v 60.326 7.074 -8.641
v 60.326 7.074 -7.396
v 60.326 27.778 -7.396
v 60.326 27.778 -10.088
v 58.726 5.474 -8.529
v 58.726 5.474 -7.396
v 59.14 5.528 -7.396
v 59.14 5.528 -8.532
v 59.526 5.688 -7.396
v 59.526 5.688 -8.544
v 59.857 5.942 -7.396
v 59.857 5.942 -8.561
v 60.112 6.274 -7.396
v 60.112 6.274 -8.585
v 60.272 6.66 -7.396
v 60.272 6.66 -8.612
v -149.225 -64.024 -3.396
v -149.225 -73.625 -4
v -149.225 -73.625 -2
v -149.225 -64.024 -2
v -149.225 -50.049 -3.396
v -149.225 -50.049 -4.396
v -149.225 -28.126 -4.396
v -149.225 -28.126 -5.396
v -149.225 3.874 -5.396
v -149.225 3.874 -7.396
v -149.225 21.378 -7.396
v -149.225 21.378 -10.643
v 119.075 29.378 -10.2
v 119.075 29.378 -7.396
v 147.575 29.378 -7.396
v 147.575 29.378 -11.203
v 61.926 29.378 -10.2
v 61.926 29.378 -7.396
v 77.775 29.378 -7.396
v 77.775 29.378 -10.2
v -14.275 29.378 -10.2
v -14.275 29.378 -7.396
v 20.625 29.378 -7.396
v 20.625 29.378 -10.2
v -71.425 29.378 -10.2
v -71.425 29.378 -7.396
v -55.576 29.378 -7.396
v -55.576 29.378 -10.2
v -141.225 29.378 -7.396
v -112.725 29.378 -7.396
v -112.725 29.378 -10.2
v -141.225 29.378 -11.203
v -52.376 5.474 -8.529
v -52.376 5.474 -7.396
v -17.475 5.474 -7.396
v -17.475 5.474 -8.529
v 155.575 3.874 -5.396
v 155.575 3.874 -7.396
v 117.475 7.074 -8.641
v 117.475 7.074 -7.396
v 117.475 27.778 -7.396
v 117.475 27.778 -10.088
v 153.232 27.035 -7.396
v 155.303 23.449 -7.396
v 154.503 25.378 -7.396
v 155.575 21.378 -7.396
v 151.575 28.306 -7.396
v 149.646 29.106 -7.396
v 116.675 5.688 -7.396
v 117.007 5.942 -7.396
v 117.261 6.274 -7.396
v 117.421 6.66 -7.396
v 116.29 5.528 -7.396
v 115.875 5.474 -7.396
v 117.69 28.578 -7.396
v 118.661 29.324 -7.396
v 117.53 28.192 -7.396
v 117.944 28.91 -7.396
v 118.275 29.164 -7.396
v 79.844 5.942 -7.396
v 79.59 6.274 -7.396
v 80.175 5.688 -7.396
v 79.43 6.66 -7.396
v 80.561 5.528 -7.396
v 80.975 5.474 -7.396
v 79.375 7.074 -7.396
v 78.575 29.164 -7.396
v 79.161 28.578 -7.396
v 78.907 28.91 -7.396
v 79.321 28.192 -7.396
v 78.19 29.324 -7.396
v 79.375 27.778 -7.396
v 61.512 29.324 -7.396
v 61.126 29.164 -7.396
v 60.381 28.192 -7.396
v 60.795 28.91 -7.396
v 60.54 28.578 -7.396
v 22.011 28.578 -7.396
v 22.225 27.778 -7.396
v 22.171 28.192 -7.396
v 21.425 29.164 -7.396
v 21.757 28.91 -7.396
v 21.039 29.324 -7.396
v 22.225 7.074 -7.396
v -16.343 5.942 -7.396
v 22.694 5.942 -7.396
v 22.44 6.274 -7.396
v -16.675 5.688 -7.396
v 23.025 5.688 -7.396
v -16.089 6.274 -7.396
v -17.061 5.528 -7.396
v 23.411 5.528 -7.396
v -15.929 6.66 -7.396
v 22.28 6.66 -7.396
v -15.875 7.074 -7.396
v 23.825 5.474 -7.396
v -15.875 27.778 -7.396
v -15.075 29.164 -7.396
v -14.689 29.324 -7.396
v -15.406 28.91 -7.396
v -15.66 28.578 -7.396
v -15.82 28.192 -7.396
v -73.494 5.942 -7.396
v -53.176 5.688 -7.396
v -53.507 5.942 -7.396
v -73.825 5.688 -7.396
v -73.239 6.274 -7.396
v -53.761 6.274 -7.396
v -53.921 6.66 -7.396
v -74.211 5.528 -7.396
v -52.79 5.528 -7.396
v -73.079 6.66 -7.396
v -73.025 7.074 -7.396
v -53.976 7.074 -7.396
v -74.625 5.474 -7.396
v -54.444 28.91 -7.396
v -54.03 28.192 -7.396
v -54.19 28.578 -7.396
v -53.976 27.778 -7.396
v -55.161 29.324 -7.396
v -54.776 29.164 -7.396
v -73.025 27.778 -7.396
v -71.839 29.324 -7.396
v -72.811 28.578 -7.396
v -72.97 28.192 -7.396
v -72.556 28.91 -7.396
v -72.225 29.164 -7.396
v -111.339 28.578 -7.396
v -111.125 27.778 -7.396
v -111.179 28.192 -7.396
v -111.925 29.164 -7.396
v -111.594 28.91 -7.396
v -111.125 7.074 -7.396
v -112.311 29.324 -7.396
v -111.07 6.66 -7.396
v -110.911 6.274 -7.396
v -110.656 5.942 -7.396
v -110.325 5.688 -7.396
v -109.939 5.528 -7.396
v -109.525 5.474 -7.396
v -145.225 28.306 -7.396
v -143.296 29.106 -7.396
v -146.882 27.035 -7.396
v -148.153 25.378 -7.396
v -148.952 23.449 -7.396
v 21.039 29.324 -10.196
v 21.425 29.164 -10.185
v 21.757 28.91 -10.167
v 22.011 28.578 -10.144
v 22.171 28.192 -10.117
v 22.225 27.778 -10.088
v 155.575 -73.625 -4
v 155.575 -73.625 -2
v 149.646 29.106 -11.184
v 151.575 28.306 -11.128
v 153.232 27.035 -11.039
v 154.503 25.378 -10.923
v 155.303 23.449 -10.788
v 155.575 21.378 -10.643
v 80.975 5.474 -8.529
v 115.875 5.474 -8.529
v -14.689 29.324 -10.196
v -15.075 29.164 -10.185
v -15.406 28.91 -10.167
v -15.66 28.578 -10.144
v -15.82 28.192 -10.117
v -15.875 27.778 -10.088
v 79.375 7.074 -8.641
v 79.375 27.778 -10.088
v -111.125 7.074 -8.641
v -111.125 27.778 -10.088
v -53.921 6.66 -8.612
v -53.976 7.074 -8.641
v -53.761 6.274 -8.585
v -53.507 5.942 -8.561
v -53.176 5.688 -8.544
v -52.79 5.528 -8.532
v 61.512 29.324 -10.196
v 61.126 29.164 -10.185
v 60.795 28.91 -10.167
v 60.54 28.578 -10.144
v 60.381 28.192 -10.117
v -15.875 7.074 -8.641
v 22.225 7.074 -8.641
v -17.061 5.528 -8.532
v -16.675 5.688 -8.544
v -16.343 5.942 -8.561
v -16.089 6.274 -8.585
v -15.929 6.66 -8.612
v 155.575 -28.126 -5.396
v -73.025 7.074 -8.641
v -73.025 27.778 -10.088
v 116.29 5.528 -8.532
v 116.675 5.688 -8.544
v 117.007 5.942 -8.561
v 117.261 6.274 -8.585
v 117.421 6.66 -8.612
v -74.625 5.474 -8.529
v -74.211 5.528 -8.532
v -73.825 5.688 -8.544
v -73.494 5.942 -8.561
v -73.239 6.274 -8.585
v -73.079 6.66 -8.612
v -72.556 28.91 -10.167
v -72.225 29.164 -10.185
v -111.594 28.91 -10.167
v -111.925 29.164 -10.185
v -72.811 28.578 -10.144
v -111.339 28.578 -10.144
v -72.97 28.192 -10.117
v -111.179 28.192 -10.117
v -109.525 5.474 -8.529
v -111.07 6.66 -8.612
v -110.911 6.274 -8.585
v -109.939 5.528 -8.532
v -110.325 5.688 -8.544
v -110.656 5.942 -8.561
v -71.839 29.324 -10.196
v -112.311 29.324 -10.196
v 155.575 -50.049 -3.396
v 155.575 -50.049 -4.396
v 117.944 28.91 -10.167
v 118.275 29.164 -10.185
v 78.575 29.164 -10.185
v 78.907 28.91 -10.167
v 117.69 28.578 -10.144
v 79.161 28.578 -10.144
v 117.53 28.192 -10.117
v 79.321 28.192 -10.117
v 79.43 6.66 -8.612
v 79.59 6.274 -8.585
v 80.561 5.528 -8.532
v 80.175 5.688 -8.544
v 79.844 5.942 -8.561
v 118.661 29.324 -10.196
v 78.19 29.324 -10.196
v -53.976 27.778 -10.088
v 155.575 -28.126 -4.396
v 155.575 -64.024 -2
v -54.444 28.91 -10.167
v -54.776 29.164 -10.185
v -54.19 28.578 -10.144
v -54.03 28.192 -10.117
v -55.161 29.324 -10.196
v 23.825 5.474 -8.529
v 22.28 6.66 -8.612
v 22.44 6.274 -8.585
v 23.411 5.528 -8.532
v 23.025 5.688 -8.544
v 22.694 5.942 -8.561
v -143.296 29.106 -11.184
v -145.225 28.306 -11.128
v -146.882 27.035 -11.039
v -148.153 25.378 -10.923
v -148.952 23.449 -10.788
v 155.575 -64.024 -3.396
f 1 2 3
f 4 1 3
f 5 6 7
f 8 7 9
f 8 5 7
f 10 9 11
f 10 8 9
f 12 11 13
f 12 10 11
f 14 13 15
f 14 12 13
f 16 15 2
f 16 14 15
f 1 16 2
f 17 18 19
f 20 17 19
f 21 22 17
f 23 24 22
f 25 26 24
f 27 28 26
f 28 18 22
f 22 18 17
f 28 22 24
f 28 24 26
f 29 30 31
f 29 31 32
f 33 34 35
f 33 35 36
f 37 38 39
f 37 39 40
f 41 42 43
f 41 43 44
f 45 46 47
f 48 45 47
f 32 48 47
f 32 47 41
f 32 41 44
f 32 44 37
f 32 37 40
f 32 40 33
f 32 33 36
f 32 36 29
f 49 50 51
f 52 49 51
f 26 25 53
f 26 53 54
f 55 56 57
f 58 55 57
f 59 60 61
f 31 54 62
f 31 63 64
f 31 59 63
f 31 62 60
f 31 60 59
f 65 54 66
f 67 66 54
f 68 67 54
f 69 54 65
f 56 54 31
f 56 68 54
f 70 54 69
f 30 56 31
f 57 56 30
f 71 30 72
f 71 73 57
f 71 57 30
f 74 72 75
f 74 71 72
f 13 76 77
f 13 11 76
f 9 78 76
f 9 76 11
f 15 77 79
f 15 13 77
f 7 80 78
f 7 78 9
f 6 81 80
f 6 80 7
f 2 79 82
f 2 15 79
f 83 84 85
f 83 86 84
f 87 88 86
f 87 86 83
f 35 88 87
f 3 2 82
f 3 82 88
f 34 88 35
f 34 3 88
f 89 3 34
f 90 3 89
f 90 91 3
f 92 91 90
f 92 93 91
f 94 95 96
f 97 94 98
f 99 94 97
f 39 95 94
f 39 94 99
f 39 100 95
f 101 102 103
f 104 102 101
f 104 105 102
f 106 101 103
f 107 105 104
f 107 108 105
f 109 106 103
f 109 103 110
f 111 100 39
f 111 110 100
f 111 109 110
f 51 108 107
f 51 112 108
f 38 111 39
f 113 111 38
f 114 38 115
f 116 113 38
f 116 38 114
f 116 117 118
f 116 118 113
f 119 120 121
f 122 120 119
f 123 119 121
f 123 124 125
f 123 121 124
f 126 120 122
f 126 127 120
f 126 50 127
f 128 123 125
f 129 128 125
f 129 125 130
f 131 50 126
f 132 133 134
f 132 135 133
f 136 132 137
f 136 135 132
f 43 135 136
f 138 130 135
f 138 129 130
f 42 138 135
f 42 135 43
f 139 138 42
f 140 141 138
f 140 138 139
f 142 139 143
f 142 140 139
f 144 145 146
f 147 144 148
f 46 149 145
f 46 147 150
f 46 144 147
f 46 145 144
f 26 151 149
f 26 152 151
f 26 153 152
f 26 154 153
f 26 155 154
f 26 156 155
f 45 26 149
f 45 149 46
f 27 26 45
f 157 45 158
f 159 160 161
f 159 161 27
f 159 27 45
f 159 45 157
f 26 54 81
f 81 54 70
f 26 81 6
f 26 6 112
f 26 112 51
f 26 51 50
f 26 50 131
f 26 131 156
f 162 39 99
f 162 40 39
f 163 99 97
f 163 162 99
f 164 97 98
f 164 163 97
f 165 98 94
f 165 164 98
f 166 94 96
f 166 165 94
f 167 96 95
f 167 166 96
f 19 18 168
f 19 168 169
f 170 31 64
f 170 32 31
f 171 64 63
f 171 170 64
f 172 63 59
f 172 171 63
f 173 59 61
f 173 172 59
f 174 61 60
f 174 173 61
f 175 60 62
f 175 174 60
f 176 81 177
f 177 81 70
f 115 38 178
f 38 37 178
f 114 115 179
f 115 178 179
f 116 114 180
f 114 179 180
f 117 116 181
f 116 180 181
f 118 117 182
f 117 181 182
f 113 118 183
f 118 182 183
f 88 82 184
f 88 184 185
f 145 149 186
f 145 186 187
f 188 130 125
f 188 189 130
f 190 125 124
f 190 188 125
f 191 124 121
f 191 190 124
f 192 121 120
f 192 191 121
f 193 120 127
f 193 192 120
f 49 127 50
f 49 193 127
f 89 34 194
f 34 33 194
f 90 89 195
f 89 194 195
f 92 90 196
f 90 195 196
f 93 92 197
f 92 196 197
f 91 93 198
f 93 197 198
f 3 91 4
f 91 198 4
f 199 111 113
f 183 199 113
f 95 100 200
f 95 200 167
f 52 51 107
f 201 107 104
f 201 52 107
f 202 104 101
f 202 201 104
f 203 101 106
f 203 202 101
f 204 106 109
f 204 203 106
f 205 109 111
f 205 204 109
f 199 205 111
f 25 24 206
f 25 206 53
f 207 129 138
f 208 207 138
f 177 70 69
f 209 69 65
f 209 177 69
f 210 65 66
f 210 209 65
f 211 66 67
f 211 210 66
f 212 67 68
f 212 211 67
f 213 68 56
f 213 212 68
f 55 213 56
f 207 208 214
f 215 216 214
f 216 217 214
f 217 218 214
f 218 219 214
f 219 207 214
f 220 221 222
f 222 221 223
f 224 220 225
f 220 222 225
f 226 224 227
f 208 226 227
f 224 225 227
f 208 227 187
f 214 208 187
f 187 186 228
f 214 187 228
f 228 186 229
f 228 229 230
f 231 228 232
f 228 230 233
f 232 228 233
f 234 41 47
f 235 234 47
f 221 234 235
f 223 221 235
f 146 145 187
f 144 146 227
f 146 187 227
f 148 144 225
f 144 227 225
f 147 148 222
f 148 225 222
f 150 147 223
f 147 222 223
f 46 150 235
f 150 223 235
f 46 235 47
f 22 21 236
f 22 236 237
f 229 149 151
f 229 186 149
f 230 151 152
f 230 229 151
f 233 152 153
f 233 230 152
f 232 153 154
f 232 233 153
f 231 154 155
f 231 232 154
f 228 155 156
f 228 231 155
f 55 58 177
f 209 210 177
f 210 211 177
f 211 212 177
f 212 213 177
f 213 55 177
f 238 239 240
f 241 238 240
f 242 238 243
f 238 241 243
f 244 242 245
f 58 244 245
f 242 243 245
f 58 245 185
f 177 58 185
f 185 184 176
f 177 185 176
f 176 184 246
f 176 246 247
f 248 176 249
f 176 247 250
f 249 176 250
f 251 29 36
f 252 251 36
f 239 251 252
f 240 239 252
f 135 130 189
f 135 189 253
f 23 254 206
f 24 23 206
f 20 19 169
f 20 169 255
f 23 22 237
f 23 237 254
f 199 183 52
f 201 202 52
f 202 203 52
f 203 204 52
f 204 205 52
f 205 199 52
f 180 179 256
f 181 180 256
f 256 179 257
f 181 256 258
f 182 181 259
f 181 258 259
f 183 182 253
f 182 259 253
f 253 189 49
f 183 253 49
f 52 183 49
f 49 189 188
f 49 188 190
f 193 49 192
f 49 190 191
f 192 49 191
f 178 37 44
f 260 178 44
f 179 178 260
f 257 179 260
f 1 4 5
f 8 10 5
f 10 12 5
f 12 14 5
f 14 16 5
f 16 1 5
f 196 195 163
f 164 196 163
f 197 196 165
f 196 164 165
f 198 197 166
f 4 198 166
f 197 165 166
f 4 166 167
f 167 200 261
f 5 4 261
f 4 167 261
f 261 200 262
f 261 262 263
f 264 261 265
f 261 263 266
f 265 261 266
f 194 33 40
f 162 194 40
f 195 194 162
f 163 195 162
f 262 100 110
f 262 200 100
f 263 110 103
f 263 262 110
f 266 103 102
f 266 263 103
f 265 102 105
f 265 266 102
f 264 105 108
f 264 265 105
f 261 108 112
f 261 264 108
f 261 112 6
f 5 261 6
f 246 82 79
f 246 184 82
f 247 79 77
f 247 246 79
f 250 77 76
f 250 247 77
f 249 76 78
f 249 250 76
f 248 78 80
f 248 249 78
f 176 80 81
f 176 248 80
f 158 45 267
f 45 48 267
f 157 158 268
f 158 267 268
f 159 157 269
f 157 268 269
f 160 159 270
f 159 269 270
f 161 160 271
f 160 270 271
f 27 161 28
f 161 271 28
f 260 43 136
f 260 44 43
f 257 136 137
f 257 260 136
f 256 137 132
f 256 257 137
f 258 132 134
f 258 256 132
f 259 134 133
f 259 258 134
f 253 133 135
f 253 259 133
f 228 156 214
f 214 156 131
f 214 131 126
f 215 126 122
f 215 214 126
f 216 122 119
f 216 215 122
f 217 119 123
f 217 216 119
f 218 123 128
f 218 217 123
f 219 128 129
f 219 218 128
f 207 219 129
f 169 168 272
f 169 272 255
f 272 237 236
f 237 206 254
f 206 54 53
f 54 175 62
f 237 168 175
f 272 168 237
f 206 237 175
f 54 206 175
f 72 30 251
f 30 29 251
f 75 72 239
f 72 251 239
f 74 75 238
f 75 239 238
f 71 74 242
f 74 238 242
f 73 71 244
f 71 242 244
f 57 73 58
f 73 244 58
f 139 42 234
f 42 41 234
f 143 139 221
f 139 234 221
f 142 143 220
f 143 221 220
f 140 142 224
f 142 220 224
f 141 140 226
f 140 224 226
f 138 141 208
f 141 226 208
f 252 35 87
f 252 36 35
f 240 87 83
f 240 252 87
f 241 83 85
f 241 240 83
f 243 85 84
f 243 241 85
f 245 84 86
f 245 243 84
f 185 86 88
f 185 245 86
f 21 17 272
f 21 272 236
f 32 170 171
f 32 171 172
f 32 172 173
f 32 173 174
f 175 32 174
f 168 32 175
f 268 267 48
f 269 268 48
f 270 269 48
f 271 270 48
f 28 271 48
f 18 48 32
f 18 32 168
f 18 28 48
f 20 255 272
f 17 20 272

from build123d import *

# Parameters (mm, degrees)
BOSS_EXTRUDE1_DEPTH              = 304.800275
FILLET1_R                        = 8
CUT_EXTRUDE1_REACH               = 6.806
CUT_EXTRUDE1_OFFSET_FROM_SURFACE = 1
SKETCH2_W                        = 38.10085
SKETCH2_H                        = 23.904524524
SKETCH2_W_2                      = 38.1
FILLET2_R                        = 1.6
FILLET3_R                        = 1.6


with BuildPart() as part:
    # Sketch1 → Boss-Extrude1 (new body)
    with BuildSketch(Plane.ZY.offset(149.225)):
        Polygon((-2, -64.023653), (-3.3962, -64.023653), (-3.3962, -50.048837521), (-4.3962, -50.048837521), (-4.3962, -28.126347), (-5.3962, -28.126347), (-5.3962, 3.873653), (-7.3962, 3.873653), (-7.3962, 29.378177524), (-11.202667042, 29.378177524), (-4, -73.62476), (-2, -73.62476), align=None)
    extrude(amount=-BOSS_EXTRUDE1_DEPTH)

    # Fillet1
    fillet1_edges = [part.edges().sort_by_distance(p)[0] for p in [
        (-149.225, 29.378177524, -9.299433521),
        (155.575275, 29.378177524, -9.299433521),
    ]]
    fillet(fillet1_edges, radius=FILLET1_R)

    # Cut-Extrude1: up to this face of the body (flat: up to its plane, moved by the offset)
    cut_extrude1_end = Plane(part.part.faces().sort_by_distance((3.1751375, -22.166826572, -7.598289234))[0]).offset(-CUT_EXTRUDE1_OFFSET_FROM_SURFACE)
    # Sketch2 → Cut-Extrude1 (cut, up to the picked face)
    with BuildSketch(Plane.XY.offset(-7.3962), mode=Mode.PRIVATE) as cut_extrude1_sk1:
        with Locations((41.2757, 17.425915262)):
            Rectangle(SKETCH2_W, SKETCH2_H)
    cut_extrude1_tool1 = split(extrude(cut_extrude1_sk1.sketch, amount=-CUT_EXTRUDE1_REACH, mode=Mode.PRIVATE), bisect_by=cut_extrude1_end, keep=Keep.BOTH, mode=Mode.PRIVATE)
    add(cut_extrude1_tool1.solids().sort_by_distance((41.2757, 17.425915, -7.3962))[0], mode=Mode.SUBTRACT)
    # Sketch2 → Cut-Extrude1 (cut, up to the picked face)
    with BuildSketch(Plane.XY.offset(-7.3962), mode=Mode.PRIVATE) as cut_extrude1_sk2:
        with Locations((-92.074875, 17.425915262)):
            Rectangle(SKETCH2_W_2, SKETCH2_H)
    cut_extrude1_tool2 = split(extrude(cut_extrude1_sk2.sketch, amount=-CUT_EXTRUDE1_REACH, mode=Mode.PRIVATE), bisect_by=cut_extrude1_end, keep=Keep.BOTH, mode=Mode.PRIVATE)
    add(cut_extrude1_tool2.solids().sort_by_distance((-92.074875, 17.425915, -7.3962))[0], mode=Mode.SUBTRACT)
    # Sketch2 → Cut-Extrude1 (cut, up to the picked face)
    with BuildSketch(Plane.XY.offset(-7.3962), mode=Mode.PRIVATE) as cut_extrude1_sk3:
        with Locations((-34.92515, 17.425915262)):
            Rectangle(SKETCH2_W, SKETCH2_H)
    cut_extrude1_tool3 = split(extrude(cut_extrude1_sk3.sketch, amount=-CUT_EXTRUDE1_REACH, mode=Mode.PRIVATE), bisect_by=cut_extrude1_end, keep=Keep.BOTH, mode=Mode.PRIVATE)
    add(cut_extrude1_tool3.solids().sort_by_distance((-34.92515, 17.425915, -7.3962))[0], mode=Mode.SUBTRACT)
    # Sketch2 → Cut-Extrude1 (cut, up to the picked face)
    with BuildSketch(Plane.XY.offset(-7.3962), mode=Mode.PRIVATE) as cut_extrude1_sk4:
        with Locations((98.425425, 17.425915262)):
            Rectangle(SKETCH2_W_2, SKETCH2_H)
    cut_extrude1_tool4 = split(extrude(cut_extrude1_sk4.sketch, amount=-CUT_EXTRUDE1_REACH, mode=Mode.PRIVATE), bisect_by=cut_extrude1_end, keep=Keep.BOTH, mode=Mode.PRIVATE)
    add(cut_extrude1_tool4.solids().sort_by_distance((98.425425, 17.425915, -7.3962))[0], mode=Mode.SUBTRACT)

    # Fillet2
    fillet2_edges = [part.edges().sort_by_distance(p)[0] for p in [
        (-73.024875, 5.473653, -7.962428976),
        (-111.124875, 5.473653, -7.962428976),
        (-15.874725, 5.473653, -7.962428976),
        (-53.975575, 5.473653, -7.962428976),
        (22.225275, 5.473653, -7.962428976),
        (60.326125, 5.473653, -7.962428976),
        (79.375425, 5.473653, -7.962428976),
        (117.475425, 5.473653, -7.962428976),
    ]]
    fillet(fillet2_edges, radius=FILLET2_R)

    # Fillet3
    fillet3_edges = [part.edges().sort_by_distance(p)[0] for p in [
        (-73.024875, 29.378177524, -8.798212572),
        (-111.124875, 29.378177524, -8.798212572),
        (-15.874725, 29.378177524, -8.798212572),
        (-53.975575, 29.378177524, -8.798212572),
        (60.326125, 29.378177524, -8.798212572),
        (22.225275, 29.378177524, -8.798212572),
        (117.475425, 29.378177524, -8.798212572),
        (79.375425, 29.378177524, -8.798212572),
    ]]
    fillet(fillet3_edges, radius=FILLET3_R)


solid = part.part
